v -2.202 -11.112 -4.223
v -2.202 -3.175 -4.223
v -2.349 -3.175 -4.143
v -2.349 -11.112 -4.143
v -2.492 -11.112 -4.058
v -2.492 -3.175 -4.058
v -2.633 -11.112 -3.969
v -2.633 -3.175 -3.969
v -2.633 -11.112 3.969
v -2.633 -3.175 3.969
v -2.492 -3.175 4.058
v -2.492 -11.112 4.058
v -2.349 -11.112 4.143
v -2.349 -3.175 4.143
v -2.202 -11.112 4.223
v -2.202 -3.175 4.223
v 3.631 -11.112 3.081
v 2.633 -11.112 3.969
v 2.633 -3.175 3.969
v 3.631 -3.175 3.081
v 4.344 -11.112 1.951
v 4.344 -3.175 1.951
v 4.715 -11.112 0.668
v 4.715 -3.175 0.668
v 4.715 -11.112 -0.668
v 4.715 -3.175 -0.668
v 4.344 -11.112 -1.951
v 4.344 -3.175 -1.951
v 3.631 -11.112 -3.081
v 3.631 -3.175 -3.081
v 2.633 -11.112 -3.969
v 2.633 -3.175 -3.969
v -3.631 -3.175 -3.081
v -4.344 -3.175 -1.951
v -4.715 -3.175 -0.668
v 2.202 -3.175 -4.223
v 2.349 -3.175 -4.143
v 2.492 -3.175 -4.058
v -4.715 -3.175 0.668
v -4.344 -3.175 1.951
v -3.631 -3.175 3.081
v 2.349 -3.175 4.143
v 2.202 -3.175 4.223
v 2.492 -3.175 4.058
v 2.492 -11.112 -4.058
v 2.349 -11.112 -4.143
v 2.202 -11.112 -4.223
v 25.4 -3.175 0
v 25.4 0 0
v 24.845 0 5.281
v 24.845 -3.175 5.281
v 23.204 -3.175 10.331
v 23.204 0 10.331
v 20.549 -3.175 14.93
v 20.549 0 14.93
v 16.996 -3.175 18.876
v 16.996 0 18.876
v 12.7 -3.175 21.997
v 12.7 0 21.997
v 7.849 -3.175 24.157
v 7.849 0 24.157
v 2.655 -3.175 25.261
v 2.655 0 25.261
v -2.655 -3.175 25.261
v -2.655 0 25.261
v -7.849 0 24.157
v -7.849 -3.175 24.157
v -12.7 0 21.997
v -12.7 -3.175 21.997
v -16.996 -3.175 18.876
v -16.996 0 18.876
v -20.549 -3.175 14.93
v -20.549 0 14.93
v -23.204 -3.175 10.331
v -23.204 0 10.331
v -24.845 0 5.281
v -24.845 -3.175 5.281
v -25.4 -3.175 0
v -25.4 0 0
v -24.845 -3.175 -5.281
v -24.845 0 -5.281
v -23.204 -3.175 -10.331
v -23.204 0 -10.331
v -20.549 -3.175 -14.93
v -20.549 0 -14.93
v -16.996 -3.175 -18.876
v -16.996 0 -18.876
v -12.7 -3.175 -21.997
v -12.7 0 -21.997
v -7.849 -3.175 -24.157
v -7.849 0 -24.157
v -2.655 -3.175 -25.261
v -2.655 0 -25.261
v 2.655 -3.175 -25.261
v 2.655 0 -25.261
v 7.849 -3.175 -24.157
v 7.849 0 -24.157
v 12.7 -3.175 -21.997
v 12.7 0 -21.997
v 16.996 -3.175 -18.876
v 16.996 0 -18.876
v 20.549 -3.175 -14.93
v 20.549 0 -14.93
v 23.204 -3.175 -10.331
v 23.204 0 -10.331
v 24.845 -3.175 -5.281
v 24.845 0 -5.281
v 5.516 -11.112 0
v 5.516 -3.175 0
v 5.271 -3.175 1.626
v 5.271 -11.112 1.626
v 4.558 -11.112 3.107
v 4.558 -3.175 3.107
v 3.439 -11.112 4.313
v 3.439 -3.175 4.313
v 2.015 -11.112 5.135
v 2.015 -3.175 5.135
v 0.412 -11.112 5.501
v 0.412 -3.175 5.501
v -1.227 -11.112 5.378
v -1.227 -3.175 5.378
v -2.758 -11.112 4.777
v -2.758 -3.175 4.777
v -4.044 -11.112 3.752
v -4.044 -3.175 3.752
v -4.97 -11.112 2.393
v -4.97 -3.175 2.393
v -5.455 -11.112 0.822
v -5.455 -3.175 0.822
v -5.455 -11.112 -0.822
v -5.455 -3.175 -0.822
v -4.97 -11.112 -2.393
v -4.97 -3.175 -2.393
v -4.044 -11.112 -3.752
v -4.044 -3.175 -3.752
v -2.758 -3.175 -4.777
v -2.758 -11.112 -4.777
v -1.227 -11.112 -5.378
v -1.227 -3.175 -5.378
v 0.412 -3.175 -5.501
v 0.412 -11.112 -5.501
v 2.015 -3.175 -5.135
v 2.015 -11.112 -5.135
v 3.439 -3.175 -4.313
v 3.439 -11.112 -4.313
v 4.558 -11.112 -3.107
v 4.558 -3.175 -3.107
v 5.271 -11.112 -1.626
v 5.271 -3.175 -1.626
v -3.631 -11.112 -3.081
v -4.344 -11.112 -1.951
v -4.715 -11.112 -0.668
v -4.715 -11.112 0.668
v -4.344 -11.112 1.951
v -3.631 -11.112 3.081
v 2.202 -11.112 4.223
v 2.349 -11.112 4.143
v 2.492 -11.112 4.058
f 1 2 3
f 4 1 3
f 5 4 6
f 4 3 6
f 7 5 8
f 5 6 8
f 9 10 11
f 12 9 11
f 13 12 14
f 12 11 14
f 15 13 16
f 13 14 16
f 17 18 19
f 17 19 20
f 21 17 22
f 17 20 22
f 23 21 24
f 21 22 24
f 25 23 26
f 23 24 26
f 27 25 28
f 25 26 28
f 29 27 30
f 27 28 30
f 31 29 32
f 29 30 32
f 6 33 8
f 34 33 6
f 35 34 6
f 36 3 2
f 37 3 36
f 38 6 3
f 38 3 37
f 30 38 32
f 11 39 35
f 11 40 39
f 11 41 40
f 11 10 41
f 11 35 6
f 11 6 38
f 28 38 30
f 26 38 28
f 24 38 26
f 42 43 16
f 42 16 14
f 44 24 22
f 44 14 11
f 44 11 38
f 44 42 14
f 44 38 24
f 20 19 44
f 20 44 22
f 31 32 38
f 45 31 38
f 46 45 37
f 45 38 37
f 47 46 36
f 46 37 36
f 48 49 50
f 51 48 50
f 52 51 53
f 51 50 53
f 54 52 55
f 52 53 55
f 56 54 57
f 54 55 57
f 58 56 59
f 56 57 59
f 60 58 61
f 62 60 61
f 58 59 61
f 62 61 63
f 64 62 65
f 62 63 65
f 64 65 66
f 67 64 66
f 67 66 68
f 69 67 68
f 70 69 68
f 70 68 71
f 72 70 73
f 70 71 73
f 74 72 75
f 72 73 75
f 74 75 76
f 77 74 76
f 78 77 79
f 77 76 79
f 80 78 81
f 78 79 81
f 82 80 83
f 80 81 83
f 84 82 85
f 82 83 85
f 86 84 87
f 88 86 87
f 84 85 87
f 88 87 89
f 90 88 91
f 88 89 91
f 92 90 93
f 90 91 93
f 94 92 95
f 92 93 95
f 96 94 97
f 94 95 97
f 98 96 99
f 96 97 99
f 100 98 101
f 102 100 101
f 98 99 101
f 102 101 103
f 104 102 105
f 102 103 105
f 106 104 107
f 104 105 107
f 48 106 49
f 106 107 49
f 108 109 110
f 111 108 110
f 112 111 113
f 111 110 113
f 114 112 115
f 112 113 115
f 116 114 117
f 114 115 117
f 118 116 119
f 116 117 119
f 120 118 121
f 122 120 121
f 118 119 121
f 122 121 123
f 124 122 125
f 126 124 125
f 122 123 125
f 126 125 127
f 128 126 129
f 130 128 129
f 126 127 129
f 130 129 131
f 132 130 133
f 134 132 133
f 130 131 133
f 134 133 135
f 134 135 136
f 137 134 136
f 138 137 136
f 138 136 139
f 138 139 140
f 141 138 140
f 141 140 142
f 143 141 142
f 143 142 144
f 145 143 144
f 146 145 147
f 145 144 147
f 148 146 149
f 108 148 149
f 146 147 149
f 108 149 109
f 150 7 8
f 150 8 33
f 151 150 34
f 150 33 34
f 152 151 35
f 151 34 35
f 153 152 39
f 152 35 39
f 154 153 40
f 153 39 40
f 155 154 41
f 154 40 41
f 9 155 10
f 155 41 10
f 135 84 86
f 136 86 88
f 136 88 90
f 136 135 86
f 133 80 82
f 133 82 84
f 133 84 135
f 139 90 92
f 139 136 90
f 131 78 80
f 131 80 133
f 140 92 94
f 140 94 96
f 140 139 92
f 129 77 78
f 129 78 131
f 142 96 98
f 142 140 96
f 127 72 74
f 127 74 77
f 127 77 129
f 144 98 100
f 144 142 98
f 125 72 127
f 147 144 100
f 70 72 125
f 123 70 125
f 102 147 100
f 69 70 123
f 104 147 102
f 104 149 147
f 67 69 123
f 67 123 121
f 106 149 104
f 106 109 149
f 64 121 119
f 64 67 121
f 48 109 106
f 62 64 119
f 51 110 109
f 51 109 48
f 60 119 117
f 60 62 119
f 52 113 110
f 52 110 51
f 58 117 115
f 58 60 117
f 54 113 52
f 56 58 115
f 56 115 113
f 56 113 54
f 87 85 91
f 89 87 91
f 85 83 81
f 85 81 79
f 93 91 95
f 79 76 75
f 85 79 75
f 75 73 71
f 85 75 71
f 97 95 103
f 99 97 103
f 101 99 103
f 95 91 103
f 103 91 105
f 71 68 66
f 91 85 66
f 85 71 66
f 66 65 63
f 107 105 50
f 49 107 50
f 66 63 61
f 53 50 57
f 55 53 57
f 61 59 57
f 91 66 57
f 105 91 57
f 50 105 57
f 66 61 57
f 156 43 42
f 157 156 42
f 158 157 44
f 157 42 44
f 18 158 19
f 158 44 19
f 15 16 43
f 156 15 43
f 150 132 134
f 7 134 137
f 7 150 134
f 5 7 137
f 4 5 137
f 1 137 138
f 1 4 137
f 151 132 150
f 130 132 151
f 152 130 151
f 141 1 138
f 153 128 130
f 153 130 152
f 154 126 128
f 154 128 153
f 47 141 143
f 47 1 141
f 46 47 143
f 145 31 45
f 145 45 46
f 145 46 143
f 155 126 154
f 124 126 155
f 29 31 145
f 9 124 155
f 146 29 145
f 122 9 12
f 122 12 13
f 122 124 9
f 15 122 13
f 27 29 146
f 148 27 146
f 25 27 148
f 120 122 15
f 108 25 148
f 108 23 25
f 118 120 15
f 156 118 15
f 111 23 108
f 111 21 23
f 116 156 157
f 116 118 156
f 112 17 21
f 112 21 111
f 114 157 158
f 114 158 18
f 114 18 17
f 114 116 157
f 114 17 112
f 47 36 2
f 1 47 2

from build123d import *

# Parameters (mm, degrees)
F0_R     = 25.4
F1_DEPTH = 3.175
F2_R     = 5.516158
F3_DEPTH = 7.9375


with BuildPart() as f1:
    # F0 (on Front) → F1 (new body)
    with BuildSketch(Plane.XZ):
        Circle(F0_R)
    extrude(amount=F1_DEPTH)

    # F2 (on face) → F3 (join)
    with BuildSketch(Plane.XZ.offset(3.175)):
        Circle(F2_R)
        with BuildLine():
            ThreePointArc((-2.632571, 3.96875), (-2.420731, 4.101398), (-2.202224, 4.22275))
            Line((-2.202224, 4.22275), (2.202224, 4.22275))
            ThreePointArc((2.202224, 4.22275), (2.420731, 4.101398), (2.632571, 3.96875))
            ThreePointArc((2.632571, 3.96875), (4.7625, 0), (2.632571, -3.96875))
            ThreePointArc((2.632571, -3.96875), (2.420731, -4.101398), (2.202224, -4.22275))
            Line((2.202224, -4.22275), (-2.202224, -4.22275))
            ThreePointArc((-2.202224, -4.22275), (-2.420731, -4.101398), (-2.632571, -3.96875))
            ThreePointArc((-2.632571, -3.96875), (-4.7625, 0), (-2.632571, 3.96875))
        make_face(mode=Mode.SUBTRACT)
    extrude(amount=F3_DEPTH)


solid = f1.part
